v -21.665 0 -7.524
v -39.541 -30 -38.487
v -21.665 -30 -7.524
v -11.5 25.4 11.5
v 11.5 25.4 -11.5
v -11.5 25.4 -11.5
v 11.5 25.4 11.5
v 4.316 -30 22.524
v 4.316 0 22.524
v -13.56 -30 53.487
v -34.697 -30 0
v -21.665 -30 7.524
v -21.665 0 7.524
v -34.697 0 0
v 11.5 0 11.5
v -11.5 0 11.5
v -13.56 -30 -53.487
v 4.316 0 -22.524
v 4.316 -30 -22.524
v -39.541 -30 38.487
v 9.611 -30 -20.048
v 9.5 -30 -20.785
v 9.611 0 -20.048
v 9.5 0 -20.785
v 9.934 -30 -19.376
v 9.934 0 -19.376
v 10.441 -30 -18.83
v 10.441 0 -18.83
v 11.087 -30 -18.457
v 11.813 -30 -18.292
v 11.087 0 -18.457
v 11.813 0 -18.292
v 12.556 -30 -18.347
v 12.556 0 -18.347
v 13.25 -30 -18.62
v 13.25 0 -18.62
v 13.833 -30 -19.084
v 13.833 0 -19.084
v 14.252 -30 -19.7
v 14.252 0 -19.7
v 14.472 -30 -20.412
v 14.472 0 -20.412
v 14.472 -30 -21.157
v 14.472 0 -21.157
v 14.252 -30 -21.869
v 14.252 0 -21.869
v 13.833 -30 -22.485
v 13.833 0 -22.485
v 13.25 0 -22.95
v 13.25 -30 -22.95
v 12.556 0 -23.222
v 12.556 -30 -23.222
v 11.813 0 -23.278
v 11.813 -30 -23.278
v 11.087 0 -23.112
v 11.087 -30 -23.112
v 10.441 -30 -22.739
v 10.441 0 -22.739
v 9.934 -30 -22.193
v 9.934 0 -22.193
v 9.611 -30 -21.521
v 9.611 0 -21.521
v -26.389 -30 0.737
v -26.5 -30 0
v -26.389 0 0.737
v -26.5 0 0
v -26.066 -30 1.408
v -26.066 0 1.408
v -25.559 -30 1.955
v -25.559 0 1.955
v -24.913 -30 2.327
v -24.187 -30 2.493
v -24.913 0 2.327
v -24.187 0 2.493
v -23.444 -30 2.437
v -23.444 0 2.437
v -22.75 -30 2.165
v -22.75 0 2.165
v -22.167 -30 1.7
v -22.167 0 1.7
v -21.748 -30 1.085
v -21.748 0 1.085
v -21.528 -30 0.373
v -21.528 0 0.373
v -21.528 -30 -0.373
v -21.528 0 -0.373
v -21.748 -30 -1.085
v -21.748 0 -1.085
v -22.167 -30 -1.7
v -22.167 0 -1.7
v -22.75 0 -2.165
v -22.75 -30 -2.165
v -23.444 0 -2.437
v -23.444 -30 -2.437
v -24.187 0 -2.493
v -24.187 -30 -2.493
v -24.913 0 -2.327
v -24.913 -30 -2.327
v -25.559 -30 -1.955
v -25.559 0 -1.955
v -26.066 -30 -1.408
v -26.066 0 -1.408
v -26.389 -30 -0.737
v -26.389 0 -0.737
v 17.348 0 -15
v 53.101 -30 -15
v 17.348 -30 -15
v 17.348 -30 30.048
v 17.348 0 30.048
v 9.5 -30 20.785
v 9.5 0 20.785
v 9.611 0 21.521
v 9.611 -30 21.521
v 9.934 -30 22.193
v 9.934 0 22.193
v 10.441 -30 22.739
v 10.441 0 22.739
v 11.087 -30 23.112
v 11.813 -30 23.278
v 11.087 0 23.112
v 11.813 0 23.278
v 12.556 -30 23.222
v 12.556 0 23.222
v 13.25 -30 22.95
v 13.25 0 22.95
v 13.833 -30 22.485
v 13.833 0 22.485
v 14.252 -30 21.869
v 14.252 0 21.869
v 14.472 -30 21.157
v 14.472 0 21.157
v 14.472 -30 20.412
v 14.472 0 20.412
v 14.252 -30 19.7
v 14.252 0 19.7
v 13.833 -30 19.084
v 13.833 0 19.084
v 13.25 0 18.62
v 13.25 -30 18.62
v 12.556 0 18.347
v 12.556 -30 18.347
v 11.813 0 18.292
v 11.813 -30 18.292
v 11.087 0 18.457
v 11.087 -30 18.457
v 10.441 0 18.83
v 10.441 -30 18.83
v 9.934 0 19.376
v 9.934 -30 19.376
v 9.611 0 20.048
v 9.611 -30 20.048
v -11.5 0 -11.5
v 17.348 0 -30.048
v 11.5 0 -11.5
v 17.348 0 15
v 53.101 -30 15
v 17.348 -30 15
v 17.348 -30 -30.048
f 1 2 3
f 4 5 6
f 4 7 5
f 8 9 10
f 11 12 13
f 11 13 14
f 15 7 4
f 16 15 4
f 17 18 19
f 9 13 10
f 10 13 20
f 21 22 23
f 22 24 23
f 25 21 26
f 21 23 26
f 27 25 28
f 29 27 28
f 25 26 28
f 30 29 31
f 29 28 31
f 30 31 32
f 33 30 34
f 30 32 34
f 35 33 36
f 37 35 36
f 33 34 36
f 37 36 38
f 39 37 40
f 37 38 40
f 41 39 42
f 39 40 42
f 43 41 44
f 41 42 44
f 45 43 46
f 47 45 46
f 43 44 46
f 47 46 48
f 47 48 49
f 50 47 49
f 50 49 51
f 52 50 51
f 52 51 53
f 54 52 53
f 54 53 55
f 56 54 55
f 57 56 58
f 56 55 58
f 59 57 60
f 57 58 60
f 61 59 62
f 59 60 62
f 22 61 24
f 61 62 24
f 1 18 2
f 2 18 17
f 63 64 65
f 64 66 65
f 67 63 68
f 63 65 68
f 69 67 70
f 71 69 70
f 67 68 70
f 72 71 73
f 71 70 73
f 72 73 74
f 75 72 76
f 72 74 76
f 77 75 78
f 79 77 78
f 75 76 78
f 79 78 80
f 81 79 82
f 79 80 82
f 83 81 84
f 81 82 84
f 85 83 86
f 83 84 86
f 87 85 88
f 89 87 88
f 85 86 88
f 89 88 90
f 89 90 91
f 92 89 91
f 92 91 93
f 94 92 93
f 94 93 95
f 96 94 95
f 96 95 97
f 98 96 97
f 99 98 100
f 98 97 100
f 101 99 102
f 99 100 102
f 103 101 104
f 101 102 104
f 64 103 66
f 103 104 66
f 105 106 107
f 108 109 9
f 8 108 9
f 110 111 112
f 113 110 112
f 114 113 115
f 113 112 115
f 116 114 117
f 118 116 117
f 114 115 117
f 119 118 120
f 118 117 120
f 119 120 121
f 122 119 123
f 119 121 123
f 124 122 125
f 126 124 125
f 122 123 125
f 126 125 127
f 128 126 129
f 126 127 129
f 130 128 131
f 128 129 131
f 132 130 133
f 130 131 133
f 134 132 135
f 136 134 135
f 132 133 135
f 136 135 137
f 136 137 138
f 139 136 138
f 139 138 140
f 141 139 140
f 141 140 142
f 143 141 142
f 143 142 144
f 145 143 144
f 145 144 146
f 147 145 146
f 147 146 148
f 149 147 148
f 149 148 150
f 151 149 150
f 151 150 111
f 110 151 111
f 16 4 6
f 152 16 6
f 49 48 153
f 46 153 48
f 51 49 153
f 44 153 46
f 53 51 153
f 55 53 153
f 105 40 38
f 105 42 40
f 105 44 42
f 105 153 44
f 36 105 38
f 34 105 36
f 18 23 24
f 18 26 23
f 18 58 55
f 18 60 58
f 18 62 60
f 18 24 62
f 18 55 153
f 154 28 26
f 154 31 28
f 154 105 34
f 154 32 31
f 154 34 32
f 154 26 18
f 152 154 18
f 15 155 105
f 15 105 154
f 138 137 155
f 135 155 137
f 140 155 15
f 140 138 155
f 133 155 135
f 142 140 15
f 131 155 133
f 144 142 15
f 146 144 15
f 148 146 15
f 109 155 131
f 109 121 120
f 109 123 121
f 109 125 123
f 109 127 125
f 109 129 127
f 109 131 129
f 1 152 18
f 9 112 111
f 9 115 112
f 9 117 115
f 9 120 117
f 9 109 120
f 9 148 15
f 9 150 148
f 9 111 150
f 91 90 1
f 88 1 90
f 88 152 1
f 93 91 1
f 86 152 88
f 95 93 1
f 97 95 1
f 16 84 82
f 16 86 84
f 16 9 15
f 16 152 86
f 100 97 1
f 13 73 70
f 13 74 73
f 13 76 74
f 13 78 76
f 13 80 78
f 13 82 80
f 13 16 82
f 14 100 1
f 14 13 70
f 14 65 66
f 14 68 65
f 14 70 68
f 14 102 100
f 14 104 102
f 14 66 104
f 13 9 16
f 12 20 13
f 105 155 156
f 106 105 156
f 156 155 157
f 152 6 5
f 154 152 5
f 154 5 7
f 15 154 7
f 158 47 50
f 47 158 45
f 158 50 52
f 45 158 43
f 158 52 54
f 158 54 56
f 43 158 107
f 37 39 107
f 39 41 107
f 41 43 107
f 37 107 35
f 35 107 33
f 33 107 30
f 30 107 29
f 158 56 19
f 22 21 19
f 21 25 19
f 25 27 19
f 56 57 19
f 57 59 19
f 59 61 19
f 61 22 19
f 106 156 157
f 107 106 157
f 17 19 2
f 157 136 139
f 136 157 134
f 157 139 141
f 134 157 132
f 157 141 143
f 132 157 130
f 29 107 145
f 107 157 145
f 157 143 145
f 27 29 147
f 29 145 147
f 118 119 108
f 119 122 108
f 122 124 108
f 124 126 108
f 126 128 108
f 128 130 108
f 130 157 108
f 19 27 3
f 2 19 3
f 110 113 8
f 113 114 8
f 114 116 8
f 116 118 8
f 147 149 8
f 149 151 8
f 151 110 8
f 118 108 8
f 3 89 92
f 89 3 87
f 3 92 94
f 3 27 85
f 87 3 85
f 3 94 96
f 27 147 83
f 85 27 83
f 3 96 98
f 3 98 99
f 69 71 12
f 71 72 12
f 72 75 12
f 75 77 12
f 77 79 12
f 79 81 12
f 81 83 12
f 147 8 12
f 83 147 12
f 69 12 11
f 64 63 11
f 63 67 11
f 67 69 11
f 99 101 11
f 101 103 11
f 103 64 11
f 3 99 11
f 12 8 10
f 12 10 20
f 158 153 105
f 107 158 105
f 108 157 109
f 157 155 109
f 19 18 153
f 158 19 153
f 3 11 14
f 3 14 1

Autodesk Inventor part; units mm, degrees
ref_plane "YZ Plane" through (0, 0, 0) normal (1, 0, 0) x (0, 1, 0)
ref_plane "XZ Plane" through (0, 0, 0) normal (0, 1, 0) x (-1, 0, 0)
ref_plane "XY Plane" through (0, 0, 0) normal (0, 0, 1) x (1, 0, 0)
sketch "Sketch1" plane through (0, 0, 0) normal (0, 1, 0) x (-1, 0, 0)
  line L0 (34.697, 0) -> (-17.3485, -30.0485)
  line L1 (-17.3485, -30.0485) -> (-17.3485, 30.0485)
  line L2 (-17.3485, 30.0485) -> (34.697, 0)
  line L3 (12.7, -12.7) -> (-12.7, -12.7) construction
  line L4 (-12.7, -12.7) -> (-12.7, 12.7) construction
  line L5 (-12.7, 12.7) -> (12.7, 12.7) construction
  line L6 (12.7, 12.7) -> (12.7, -12.7) construction
  line L7 (-17.3485, 15) -> (-117.3485, 15)
  line L8 (-117.3485, 15) -> (-117.3485, -15)
  line L9 (-117.3485, -15) -> (-17.3485, -15)
  line L10 (-4.3161, -22.5243) -> (45.6839, -109.1268)
  line L11 (45.6839, -109.1268) -> (71.6646, -94.1268)
  line L12 (71.6646, -94.1268) -> (21.6646, -7.5243)
  line L13 (0, 0) -> (58.6743, -101.6268) construction
  line L14 (0, 0) -> (-117.3485, 0) construction
  line L15 (-4.3161, 22.5243) -> (45.6839, 109.1268)
  line L16 (45.6839, 109.1268) -> (71.6646, 94.1268)
  line L17 (71.6646, 94.1268) -> (21.6646, 7.5243)
  line L18 (58.6743, 101.6268) -> (0, 0) construction
  line L19 (11.5, -11.5) -> (-11.5, -11.5)
  line L20 (-11.5, -11.5) -> (-11.5, 11.5)
  line L21 (-11.5, 11.5) -> (11.5, 11.5)
  line L22 (11.5, 11.5) -> (11.5, -11.5)
  circle A0 centre (-12, 20.7846) radius 2.5
  line L23 (0, 0) -> (-17.3485, 30.0485) construction
  line L24 (0, 0) -> (-17.3485, -30.0485) construction
  line L25 (0, 0) -> (34.697, 0) construction
  circle A1 centre (-12, -20.7846) radius 2.5
  circle A2 centre (24, 0) radius 2.5
  dimension "d1" = 25.4
  dimension "d2" = 30
  dimension "d3" = 100
  dimension "d4" = 30
  dimension "d5" = 100
  dimension "d6" = 120
  dimension "d7" = 30
  dimension "d8" = 100
  dimension "d9" = 120
  dimension "d10" = 23
  dimension "d21" = 5
  dimension "d22" = 24
  dimension "d23" = 5
  dimension "d24" = 5
  dimension "d25" = 24
  dimension "d26" = 24
extrude "Extrusion1" add sketch "Sketch1" against normal blind 30 contours L0 L1 L2 | L12 L11 L10 L0 | L2 L15 L16 L17 | L9 L8 L7 L1 | L19 L20 L21 L22 | A0 | A1 | A2
sketch "Sketch2" plane through (17.3485, 0, 15) normal (0, 0, 1) x (1, 0, 0)
  line L0 (0, 0) -> (100, 0) construction
  line L1 (0, -30) -> (0, 0) construction
  line L2 (100, -30) -> (0, -30) construction
  line L3 (100, 0) -> (100, -30) projected
  line L4 (0, 0) -> (100, -83.91)
  line L5 (100, 0) -> (100, -30) projected
  line L6 (100, -83.91) -> (100, 0)
  line L7 (0, 0) -> (100, 0)
  point P0 (-17.3485, 0)
  dimension "d13" = 40
extrude "Extrusion2" cut sketch "Sketch2" against normal up to next
pattern_circular "Circular Pattern1" count 3 over 360 about axis through (0, -10, 0) along (0, 1, 0) of "Extrusion2"
extrude "Extrusion3" add sketch "Sketch1" along normal blind 25.4 contours L19 L20 L21 L22
extrude "Extrusion4" cut sketch "Sketch1" against normal up to next contours A0 | A1 | A2
equation "\"d4\" = d2"
equation "\"d5\" = d3"
equation "\"d7\" = d2"
equation "\"d8\" = d3"
equation "\"d9\" = d6"
equation "\"d23\" = d21"
equation "\"d24\" = d21"
equation "\"d25\" = d22"
equation "\"d26\" = d22"
properties part number "core"
